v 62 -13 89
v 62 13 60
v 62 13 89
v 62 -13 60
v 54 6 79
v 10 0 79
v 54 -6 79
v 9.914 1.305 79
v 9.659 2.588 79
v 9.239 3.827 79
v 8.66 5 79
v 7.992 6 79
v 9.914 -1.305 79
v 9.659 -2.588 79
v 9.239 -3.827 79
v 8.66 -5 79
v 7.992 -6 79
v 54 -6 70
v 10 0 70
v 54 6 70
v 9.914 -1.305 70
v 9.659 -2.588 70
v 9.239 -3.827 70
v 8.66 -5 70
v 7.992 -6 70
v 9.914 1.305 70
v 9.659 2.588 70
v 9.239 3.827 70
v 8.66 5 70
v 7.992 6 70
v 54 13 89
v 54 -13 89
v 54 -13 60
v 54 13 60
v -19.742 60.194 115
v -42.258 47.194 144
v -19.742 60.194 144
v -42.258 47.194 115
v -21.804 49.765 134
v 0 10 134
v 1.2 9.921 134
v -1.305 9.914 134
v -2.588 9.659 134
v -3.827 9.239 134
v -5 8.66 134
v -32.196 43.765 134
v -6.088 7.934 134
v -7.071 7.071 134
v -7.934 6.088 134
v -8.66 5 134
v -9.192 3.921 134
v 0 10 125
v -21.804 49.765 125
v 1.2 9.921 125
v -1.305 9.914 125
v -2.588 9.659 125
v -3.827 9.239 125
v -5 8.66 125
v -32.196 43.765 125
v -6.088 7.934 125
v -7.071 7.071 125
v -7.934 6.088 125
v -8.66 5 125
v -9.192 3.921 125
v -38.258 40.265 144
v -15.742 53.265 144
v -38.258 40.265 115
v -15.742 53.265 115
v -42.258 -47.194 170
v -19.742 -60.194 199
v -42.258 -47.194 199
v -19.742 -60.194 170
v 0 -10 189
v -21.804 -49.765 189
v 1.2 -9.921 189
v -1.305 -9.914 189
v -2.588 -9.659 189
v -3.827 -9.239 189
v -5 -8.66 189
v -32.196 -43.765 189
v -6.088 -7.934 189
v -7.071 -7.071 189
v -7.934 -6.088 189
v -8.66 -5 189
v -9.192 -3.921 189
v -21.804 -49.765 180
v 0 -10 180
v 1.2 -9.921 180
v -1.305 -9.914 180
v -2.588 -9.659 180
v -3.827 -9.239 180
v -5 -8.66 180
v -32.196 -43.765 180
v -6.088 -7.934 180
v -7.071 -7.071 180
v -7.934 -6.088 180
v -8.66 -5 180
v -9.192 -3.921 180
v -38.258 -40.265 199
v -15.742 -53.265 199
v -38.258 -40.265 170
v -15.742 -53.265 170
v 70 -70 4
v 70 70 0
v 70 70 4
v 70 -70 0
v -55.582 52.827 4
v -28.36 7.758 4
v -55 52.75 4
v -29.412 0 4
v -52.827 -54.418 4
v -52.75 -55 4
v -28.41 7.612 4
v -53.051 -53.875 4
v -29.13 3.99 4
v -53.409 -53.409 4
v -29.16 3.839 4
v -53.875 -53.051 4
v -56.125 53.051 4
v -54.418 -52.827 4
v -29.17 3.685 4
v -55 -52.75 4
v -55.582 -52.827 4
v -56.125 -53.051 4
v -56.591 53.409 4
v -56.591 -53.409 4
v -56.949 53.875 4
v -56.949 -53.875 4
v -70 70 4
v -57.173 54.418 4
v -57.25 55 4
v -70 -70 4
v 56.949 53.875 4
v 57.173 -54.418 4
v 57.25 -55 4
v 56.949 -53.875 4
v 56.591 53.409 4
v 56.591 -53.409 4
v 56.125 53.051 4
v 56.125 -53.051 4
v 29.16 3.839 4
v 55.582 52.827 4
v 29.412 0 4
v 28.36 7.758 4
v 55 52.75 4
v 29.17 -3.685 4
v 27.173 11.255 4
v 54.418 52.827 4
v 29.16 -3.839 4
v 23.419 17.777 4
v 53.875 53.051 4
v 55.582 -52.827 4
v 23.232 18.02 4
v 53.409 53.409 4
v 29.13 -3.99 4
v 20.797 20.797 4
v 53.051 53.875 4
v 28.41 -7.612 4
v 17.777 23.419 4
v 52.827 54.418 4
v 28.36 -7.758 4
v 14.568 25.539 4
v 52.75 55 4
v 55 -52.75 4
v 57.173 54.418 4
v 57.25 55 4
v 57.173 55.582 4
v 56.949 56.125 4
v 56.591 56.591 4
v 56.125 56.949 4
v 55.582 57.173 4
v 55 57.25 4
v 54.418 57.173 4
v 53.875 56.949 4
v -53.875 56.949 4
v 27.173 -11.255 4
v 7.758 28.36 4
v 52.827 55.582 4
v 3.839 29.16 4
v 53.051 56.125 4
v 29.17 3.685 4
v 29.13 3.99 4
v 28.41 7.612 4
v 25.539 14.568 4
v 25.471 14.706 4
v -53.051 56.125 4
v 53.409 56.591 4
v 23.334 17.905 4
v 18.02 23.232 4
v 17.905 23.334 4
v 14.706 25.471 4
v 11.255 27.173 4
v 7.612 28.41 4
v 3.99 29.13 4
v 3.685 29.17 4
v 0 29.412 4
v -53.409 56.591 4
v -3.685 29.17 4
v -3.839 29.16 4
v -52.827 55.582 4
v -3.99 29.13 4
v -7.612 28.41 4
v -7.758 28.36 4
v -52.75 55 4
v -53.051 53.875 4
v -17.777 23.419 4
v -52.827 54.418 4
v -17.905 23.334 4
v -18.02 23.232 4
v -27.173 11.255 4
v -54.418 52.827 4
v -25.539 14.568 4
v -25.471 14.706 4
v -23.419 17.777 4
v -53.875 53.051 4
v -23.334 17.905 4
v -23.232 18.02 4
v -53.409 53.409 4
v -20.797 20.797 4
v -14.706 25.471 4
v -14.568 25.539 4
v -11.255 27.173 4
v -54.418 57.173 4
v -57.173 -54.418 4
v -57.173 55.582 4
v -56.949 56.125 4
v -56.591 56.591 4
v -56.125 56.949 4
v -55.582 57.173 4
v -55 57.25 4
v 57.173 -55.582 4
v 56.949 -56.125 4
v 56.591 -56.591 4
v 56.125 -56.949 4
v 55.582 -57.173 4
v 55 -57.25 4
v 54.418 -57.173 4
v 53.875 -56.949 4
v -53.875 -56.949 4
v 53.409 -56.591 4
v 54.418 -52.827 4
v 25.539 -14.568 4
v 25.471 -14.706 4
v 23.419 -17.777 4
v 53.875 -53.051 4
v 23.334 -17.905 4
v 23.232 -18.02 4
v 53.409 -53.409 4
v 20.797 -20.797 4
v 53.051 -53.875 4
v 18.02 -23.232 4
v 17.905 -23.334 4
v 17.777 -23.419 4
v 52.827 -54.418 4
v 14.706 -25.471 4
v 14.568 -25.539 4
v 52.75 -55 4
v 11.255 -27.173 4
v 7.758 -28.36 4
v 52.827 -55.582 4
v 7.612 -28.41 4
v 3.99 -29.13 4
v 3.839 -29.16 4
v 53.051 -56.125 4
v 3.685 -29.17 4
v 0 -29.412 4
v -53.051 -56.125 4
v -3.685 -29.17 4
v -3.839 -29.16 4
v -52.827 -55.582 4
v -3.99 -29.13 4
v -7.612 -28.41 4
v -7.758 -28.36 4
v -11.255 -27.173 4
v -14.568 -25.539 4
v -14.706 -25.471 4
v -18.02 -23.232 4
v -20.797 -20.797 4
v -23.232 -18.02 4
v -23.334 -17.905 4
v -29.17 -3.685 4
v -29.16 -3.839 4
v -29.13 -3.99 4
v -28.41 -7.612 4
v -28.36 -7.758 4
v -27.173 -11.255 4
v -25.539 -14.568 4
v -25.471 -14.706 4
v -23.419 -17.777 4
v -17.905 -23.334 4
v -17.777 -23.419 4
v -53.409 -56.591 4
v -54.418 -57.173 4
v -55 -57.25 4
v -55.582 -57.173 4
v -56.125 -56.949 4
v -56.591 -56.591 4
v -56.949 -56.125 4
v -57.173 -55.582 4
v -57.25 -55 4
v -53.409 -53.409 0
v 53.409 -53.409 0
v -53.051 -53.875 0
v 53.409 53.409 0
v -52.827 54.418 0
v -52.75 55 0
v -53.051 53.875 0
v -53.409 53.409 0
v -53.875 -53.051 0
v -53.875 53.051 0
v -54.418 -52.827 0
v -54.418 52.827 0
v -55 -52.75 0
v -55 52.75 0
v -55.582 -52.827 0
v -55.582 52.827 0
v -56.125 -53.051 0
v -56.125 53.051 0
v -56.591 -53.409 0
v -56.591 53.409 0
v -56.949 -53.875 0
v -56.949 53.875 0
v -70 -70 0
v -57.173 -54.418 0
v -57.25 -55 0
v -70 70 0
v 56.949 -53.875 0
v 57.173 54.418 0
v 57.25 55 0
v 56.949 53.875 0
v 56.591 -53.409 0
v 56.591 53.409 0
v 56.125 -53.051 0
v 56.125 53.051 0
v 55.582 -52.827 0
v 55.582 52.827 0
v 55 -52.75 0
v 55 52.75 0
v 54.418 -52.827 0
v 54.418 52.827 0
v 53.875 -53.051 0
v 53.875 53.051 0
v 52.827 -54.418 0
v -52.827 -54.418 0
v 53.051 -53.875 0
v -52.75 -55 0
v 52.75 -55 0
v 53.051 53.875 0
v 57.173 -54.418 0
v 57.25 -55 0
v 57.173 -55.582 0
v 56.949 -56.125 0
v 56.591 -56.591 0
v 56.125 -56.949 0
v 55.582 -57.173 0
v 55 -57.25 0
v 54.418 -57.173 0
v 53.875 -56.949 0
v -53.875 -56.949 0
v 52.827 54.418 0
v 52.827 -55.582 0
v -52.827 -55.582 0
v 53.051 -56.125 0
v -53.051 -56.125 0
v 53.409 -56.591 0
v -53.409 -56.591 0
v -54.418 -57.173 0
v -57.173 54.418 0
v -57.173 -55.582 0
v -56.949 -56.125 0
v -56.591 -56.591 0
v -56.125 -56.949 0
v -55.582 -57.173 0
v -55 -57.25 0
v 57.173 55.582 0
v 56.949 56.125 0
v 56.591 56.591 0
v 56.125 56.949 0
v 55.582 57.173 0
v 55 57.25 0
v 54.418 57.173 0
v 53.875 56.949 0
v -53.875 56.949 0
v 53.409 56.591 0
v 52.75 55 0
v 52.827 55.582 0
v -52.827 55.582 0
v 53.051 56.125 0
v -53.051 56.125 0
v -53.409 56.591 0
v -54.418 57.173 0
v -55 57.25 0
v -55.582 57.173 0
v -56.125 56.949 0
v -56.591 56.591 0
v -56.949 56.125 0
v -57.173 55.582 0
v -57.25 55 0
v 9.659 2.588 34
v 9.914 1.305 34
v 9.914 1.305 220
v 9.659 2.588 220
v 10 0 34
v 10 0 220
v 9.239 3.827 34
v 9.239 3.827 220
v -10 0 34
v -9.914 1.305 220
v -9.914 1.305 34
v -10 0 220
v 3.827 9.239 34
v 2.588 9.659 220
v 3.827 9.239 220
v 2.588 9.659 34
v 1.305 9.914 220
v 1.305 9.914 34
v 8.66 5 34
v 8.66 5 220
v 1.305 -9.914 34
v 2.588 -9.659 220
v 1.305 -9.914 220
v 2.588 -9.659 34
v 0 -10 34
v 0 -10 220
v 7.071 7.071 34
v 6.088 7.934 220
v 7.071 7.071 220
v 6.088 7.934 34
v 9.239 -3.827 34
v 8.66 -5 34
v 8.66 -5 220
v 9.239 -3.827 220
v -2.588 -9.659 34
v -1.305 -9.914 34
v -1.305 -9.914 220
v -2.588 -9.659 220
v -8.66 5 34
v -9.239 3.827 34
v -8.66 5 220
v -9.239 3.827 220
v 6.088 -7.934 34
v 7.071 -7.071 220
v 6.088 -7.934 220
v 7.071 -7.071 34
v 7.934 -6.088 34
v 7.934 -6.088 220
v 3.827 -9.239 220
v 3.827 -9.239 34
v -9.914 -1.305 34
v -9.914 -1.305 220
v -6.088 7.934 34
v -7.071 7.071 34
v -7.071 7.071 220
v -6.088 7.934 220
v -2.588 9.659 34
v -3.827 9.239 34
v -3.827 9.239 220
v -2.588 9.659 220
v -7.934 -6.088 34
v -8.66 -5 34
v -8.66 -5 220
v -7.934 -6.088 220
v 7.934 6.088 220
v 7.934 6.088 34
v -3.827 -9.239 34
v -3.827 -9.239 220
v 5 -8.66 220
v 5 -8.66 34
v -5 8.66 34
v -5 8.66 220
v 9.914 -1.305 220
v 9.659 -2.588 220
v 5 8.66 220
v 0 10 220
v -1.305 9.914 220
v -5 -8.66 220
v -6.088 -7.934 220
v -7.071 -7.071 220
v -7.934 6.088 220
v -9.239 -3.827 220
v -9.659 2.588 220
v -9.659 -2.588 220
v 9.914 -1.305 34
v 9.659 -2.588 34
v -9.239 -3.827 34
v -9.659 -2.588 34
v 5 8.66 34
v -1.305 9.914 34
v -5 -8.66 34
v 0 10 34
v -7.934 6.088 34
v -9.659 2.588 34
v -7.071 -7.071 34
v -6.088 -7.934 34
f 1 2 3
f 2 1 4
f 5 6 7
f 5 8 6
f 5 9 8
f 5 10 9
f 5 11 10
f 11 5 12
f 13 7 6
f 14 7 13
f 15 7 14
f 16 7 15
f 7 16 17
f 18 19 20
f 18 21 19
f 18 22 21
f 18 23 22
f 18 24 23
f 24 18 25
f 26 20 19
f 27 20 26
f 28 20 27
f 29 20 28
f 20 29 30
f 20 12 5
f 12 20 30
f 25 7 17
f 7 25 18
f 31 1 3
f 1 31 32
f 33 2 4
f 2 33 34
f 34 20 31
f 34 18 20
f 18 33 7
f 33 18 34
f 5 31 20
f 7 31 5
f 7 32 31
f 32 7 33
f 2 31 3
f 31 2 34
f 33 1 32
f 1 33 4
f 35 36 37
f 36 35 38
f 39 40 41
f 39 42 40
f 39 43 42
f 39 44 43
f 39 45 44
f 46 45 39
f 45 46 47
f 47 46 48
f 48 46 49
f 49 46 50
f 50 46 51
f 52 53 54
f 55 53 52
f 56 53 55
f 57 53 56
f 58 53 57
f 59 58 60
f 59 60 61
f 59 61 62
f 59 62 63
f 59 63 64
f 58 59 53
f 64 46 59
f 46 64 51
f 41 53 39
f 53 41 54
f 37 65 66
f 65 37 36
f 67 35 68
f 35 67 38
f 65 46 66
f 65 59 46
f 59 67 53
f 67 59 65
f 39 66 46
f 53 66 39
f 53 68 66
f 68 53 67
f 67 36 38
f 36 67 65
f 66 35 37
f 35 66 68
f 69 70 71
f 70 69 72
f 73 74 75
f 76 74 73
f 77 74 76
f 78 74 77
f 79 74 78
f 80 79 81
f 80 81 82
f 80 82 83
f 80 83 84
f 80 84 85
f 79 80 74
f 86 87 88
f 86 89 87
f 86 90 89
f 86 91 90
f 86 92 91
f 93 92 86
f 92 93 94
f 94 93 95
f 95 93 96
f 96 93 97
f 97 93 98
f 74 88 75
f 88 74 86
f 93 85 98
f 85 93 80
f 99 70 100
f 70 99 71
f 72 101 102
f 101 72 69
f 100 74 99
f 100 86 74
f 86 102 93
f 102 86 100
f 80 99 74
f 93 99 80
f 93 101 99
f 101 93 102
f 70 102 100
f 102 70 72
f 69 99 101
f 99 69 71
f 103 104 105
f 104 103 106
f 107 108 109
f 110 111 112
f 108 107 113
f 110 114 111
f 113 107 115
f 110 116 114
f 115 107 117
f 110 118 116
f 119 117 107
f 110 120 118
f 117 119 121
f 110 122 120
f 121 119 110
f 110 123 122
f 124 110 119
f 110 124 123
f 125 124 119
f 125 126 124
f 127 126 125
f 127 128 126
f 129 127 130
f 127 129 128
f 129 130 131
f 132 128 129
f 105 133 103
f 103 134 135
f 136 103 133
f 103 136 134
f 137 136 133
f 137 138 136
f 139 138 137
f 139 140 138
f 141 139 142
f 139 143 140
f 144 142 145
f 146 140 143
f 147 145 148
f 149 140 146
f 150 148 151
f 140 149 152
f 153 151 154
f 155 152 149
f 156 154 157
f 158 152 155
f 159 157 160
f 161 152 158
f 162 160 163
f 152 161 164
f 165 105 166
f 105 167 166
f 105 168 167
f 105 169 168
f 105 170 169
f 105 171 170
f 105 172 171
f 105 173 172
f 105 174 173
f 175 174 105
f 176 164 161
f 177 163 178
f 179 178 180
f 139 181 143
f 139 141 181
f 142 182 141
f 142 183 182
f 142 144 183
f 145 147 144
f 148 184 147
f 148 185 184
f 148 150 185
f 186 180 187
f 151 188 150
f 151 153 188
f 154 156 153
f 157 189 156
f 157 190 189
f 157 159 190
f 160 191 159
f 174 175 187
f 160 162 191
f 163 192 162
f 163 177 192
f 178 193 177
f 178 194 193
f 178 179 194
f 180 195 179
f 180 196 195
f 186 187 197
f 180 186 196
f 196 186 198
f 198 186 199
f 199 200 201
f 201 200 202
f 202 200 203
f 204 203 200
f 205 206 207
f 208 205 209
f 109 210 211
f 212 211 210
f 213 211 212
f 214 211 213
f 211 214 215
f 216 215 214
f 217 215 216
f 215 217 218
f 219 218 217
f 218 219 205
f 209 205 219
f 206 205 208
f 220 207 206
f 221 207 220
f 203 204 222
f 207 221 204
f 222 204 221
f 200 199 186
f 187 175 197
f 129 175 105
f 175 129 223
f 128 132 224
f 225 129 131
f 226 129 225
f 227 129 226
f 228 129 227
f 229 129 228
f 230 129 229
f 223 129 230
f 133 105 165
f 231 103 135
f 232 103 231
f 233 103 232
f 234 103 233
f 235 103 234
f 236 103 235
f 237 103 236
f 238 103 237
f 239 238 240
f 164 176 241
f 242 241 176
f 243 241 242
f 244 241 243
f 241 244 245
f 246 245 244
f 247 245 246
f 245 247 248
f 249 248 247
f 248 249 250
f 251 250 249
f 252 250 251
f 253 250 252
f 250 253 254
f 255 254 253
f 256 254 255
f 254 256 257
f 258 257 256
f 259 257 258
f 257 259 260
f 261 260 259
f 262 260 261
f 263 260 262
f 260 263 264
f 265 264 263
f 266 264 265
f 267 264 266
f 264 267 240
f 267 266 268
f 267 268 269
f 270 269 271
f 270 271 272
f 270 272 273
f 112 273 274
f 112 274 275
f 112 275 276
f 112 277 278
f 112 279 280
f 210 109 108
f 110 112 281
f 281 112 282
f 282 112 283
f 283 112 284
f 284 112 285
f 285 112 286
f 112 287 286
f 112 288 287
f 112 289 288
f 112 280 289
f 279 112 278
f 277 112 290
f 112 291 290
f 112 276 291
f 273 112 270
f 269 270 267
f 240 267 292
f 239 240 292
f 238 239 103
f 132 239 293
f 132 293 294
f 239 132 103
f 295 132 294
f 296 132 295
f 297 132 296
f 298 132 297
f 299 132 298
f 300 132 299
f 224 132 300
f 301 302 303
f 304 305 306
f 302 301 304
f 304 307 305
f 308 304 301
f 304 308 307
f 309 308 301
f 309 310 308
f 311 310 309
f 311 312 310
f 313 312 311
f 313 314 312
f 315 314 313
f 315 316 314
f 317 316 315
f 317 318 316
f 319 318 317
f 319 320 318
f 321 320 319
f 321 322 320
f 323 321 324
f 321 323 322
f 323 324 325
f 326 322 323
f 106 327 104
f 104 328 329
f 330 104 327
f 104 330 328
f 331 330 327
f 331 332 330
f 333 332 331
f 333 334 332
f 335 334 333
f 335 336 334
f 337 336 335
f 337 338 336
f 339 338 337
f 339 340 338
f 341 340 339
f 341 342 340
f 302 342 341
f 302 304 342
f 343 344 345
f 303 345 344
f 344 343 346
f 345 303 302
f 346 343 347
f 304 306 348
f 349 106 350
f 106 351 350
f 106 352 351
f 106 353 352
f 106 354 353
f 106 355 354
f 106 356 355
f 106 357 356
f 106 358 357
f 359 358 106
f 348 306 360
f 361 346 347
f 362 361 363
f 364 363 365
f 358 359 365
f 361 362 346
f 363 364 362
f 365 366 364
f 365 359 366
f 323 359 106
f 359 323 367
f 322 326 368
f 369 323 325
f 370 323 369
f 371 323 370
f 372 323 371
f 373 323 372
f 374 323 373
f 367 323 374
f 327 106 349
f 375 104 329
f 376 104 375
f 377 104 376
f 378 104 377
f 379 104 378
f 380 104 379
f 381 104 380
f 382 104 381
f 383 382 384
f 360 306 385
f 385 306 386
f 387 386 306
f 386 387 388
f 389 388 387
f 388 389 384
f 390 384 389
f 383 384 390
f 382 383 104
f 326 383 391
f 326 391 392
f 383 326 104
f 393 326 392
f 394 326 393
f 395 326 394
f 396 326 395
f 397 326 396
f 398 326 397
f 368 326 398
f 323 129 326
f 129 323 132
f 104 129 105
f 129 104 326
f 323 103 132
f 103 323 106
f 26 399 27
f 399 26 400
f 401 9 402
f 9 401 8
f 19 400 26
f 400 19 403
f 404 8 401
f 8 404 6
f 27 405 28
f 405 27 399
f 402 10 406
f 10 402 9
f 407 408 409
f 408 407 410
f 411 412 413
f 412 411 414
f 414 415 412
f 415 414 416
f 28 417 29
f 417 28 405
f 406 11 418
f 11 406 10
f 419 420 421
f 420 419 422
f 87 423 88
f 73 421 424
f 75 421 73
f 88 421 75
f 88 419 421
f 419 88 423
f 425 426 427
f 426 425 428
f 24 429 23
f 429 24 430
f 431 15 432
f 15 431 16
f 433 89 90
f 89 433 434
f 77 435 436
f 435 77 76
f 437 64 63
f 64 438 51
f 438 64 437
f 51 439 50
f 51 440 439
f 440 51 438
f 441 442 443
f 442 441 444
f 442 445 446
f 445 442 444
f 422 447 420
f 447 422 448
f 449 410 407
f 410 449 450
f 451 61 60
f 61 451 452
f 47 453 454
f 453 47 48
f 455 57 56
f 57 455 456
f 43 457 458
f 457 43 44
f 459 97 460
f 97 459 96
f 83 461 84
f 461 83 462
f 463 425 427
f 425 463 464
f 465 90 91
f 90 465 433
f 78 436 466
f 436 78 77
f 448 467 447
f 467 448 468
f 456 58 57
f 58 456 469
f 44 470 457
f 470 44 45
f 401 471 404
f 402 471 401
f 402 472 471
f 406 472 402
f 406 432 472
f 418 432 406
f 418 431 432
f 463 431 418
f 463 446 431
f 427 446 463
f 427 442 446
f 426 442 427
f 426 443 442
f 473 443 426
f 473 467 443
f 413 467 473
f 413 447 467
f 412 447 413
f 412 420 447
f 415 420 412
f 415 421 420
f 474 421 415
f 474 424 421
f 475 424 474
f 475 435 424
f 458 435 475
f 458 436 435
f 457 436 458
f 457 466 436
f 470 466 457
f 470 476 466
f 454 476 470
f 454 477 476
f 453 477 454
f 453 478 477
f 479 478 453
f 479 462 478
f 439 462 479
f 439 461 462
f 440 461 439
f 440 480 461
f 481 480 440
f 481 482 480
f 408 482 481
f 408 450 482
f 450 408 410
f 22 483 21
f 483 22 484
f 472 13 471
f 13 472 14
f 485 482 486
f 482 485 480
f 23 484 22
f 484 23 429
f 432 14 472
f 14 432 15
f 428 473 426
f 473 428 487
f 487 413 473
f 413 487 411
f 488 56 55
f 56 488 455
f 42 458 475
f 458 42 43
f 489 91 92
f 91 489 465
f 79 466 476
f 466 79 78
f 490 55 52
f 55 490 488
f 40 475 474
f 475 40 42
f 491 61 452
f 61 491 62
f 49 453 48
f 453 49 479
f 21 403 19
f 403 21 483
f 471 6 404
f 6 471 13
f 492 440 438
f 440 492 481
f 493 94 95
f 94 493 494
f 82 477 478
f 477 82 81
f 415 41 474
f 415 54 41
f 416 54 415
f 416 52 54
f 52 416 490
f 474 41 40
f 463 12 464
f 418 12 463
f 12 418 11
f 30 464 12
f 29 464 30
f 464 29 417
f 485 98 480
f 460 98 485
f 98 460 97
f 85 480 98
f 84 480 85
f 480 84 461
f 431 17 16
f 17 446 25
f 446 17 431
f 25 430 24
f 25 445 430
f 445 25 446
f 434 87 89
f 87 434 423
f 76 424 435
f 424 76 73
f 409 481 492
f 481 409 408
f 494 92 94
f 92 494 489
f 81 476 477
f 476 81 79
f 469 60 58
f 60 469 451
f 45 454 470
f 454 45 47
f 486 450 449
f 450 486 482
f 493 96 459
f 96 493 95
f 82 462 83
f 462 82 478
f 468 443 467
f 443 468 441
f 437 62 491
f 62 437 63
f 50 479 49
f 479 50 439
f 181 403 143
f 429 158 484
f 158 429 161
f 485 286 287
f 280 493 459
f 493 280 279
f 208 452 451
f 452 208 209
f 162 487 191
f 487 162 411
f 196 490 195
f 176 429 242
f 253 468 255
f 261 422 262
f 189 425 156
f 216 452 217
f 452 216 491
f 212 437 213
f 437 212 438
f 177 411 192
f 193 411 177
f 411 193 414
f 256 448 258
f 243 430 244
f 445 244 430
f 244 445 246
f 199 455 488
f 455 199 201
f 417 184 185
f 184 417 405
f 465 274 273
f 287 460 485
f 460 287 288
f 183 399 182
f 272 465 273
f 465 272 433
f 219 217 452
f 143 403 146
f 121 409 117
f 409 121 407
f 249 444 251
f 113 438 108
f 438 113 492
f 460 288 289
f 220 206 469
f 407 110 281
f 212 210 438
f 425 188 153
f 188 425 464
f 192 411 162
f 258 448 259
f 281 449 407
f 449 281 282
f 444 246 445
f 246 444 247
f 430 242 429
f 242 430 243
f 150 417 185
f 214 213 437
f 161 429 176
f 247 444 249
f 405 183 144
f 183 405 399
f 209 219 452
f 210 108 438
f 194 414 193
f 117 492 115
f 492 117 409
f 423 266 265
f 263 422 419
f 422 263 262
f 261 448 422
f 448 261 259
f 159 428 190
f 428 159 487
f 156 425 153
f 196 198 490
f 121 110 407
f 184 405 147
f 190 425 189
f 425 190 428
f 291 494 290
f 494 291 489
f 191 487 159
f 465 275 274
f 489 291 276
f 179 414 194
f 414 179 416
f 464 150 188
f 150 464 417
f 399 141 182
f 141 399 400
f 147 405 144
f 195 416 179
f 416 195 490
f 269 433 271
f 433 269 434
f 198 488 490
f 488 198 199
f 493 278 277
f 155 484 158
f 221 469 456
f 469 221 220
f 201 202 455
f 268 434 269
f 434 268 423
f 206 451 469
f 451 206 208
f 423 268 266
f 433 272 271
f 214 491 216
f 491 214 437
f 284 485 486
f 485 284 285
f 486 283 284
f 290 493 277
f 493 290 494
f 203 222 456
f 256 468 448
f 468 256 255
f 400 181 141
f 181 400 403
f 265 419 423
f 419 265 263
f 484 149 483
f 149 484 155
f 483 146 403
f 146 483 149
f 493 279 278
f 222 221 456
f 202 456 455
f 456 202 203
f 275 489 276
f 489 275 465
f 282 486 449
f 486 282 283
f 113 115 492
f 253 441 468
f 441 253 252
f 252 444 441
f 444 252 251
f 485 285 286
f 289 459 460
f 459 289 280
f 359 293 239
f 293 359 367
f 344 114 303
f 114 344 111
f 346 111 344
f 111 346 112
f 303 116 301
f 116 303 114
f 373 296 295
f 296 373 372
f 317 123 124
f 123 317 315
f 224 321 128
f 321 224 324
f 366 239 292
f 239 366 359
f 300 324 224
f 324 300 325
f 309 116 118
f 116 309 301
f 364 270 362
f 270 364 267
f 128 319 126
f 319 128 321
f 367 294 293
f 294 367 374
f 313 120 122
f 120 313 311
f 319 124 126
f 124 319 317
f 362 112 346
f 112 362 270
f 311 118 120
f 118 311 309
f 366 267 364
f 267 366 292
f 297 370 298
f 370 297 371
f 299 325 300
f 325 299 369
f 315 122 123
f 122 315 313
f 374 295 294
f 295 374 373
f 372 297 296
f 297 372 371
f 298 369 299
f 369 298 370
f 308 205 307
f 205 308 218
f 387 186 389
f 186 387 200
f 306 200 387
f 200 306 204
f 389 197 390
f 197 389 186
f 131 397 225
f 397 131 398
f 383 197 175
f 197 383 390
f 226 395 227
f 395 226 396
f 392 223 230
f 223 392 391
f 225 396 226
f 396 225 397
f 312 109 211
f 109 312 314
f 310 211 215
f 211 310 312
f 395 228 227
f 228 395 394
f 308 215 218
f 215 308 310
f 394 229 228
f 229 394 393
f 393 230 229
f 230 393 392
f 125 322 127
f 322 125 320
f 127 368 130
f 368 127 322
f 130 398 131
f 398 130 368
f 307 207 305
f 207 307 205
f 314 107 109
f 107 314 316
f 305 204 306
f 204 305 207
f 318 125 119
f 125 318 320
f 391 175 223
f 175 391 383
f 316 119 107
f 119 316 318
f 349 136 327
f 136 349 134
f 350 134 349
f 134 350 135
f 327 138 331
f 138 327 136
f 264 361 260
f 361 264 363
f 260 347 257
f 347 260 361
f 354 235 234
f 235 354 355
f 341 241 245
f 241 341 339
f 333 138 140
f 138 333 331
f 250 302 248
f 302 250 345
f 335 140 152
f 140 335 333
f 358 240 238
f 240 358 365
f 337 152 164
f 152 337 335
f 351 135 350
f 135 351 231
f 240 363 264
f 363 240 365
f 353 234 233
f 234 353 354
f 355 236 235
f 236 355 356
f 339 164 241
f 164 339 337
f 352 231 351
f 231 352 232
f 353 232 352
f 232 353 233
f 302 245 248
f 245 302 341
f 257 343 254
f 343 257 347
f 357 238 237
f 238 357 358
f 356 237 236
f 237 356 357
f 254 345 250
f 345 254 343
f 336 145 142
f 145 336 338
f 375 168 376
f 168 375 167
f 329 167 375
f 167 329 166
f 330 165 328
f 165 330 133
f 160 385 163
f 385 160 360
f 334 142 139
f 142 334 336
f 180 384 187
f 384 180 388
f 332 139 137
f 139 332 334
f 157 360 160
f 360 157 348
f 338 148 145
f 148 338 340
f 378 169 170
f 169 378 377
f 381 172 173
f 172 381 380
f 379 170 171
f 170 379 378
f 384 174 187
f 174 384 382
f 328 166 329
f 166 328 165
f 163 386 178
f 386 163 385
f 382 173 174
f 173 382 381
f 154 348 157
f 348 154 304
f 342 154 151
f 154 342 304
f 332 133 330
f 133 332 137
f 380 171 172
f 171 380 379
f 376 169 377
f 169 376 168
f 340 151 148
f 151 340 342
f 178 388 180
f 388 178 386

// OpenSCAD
tower_height=220; base_size=140; post_diameter=20; flag_radius=62; mount_hole_diameter=4.5;
module orbit_tower(){ difference(){ union(){ translate([-base_size/2,-base_size/2,0]) cube([base_size,base_size,4]); cylinder(d=post_diameter,h=tower_height,$fn=48); cylinder(d1=64,d2=post_diameter,h=34,$fn=48); for(i=[0:2]) rotate([0,0,i*120]) translate([0,-6,70+i*55]) { cube([flag_radius,12,9]); translate([flag_radius-8,-7,-10]) cube([8,26,29]); } } for(x=[-55,55],y=[-55,55]) translate([x,y,-1]) cylinder(d=mount_hole_diameter,h=7,$fn=24); }}
assert(tower_height==220 && flag_radius>base_size/3); echo("SCADCTL_REQUIREMENT:parameters:PASS"); orbit_tower();
